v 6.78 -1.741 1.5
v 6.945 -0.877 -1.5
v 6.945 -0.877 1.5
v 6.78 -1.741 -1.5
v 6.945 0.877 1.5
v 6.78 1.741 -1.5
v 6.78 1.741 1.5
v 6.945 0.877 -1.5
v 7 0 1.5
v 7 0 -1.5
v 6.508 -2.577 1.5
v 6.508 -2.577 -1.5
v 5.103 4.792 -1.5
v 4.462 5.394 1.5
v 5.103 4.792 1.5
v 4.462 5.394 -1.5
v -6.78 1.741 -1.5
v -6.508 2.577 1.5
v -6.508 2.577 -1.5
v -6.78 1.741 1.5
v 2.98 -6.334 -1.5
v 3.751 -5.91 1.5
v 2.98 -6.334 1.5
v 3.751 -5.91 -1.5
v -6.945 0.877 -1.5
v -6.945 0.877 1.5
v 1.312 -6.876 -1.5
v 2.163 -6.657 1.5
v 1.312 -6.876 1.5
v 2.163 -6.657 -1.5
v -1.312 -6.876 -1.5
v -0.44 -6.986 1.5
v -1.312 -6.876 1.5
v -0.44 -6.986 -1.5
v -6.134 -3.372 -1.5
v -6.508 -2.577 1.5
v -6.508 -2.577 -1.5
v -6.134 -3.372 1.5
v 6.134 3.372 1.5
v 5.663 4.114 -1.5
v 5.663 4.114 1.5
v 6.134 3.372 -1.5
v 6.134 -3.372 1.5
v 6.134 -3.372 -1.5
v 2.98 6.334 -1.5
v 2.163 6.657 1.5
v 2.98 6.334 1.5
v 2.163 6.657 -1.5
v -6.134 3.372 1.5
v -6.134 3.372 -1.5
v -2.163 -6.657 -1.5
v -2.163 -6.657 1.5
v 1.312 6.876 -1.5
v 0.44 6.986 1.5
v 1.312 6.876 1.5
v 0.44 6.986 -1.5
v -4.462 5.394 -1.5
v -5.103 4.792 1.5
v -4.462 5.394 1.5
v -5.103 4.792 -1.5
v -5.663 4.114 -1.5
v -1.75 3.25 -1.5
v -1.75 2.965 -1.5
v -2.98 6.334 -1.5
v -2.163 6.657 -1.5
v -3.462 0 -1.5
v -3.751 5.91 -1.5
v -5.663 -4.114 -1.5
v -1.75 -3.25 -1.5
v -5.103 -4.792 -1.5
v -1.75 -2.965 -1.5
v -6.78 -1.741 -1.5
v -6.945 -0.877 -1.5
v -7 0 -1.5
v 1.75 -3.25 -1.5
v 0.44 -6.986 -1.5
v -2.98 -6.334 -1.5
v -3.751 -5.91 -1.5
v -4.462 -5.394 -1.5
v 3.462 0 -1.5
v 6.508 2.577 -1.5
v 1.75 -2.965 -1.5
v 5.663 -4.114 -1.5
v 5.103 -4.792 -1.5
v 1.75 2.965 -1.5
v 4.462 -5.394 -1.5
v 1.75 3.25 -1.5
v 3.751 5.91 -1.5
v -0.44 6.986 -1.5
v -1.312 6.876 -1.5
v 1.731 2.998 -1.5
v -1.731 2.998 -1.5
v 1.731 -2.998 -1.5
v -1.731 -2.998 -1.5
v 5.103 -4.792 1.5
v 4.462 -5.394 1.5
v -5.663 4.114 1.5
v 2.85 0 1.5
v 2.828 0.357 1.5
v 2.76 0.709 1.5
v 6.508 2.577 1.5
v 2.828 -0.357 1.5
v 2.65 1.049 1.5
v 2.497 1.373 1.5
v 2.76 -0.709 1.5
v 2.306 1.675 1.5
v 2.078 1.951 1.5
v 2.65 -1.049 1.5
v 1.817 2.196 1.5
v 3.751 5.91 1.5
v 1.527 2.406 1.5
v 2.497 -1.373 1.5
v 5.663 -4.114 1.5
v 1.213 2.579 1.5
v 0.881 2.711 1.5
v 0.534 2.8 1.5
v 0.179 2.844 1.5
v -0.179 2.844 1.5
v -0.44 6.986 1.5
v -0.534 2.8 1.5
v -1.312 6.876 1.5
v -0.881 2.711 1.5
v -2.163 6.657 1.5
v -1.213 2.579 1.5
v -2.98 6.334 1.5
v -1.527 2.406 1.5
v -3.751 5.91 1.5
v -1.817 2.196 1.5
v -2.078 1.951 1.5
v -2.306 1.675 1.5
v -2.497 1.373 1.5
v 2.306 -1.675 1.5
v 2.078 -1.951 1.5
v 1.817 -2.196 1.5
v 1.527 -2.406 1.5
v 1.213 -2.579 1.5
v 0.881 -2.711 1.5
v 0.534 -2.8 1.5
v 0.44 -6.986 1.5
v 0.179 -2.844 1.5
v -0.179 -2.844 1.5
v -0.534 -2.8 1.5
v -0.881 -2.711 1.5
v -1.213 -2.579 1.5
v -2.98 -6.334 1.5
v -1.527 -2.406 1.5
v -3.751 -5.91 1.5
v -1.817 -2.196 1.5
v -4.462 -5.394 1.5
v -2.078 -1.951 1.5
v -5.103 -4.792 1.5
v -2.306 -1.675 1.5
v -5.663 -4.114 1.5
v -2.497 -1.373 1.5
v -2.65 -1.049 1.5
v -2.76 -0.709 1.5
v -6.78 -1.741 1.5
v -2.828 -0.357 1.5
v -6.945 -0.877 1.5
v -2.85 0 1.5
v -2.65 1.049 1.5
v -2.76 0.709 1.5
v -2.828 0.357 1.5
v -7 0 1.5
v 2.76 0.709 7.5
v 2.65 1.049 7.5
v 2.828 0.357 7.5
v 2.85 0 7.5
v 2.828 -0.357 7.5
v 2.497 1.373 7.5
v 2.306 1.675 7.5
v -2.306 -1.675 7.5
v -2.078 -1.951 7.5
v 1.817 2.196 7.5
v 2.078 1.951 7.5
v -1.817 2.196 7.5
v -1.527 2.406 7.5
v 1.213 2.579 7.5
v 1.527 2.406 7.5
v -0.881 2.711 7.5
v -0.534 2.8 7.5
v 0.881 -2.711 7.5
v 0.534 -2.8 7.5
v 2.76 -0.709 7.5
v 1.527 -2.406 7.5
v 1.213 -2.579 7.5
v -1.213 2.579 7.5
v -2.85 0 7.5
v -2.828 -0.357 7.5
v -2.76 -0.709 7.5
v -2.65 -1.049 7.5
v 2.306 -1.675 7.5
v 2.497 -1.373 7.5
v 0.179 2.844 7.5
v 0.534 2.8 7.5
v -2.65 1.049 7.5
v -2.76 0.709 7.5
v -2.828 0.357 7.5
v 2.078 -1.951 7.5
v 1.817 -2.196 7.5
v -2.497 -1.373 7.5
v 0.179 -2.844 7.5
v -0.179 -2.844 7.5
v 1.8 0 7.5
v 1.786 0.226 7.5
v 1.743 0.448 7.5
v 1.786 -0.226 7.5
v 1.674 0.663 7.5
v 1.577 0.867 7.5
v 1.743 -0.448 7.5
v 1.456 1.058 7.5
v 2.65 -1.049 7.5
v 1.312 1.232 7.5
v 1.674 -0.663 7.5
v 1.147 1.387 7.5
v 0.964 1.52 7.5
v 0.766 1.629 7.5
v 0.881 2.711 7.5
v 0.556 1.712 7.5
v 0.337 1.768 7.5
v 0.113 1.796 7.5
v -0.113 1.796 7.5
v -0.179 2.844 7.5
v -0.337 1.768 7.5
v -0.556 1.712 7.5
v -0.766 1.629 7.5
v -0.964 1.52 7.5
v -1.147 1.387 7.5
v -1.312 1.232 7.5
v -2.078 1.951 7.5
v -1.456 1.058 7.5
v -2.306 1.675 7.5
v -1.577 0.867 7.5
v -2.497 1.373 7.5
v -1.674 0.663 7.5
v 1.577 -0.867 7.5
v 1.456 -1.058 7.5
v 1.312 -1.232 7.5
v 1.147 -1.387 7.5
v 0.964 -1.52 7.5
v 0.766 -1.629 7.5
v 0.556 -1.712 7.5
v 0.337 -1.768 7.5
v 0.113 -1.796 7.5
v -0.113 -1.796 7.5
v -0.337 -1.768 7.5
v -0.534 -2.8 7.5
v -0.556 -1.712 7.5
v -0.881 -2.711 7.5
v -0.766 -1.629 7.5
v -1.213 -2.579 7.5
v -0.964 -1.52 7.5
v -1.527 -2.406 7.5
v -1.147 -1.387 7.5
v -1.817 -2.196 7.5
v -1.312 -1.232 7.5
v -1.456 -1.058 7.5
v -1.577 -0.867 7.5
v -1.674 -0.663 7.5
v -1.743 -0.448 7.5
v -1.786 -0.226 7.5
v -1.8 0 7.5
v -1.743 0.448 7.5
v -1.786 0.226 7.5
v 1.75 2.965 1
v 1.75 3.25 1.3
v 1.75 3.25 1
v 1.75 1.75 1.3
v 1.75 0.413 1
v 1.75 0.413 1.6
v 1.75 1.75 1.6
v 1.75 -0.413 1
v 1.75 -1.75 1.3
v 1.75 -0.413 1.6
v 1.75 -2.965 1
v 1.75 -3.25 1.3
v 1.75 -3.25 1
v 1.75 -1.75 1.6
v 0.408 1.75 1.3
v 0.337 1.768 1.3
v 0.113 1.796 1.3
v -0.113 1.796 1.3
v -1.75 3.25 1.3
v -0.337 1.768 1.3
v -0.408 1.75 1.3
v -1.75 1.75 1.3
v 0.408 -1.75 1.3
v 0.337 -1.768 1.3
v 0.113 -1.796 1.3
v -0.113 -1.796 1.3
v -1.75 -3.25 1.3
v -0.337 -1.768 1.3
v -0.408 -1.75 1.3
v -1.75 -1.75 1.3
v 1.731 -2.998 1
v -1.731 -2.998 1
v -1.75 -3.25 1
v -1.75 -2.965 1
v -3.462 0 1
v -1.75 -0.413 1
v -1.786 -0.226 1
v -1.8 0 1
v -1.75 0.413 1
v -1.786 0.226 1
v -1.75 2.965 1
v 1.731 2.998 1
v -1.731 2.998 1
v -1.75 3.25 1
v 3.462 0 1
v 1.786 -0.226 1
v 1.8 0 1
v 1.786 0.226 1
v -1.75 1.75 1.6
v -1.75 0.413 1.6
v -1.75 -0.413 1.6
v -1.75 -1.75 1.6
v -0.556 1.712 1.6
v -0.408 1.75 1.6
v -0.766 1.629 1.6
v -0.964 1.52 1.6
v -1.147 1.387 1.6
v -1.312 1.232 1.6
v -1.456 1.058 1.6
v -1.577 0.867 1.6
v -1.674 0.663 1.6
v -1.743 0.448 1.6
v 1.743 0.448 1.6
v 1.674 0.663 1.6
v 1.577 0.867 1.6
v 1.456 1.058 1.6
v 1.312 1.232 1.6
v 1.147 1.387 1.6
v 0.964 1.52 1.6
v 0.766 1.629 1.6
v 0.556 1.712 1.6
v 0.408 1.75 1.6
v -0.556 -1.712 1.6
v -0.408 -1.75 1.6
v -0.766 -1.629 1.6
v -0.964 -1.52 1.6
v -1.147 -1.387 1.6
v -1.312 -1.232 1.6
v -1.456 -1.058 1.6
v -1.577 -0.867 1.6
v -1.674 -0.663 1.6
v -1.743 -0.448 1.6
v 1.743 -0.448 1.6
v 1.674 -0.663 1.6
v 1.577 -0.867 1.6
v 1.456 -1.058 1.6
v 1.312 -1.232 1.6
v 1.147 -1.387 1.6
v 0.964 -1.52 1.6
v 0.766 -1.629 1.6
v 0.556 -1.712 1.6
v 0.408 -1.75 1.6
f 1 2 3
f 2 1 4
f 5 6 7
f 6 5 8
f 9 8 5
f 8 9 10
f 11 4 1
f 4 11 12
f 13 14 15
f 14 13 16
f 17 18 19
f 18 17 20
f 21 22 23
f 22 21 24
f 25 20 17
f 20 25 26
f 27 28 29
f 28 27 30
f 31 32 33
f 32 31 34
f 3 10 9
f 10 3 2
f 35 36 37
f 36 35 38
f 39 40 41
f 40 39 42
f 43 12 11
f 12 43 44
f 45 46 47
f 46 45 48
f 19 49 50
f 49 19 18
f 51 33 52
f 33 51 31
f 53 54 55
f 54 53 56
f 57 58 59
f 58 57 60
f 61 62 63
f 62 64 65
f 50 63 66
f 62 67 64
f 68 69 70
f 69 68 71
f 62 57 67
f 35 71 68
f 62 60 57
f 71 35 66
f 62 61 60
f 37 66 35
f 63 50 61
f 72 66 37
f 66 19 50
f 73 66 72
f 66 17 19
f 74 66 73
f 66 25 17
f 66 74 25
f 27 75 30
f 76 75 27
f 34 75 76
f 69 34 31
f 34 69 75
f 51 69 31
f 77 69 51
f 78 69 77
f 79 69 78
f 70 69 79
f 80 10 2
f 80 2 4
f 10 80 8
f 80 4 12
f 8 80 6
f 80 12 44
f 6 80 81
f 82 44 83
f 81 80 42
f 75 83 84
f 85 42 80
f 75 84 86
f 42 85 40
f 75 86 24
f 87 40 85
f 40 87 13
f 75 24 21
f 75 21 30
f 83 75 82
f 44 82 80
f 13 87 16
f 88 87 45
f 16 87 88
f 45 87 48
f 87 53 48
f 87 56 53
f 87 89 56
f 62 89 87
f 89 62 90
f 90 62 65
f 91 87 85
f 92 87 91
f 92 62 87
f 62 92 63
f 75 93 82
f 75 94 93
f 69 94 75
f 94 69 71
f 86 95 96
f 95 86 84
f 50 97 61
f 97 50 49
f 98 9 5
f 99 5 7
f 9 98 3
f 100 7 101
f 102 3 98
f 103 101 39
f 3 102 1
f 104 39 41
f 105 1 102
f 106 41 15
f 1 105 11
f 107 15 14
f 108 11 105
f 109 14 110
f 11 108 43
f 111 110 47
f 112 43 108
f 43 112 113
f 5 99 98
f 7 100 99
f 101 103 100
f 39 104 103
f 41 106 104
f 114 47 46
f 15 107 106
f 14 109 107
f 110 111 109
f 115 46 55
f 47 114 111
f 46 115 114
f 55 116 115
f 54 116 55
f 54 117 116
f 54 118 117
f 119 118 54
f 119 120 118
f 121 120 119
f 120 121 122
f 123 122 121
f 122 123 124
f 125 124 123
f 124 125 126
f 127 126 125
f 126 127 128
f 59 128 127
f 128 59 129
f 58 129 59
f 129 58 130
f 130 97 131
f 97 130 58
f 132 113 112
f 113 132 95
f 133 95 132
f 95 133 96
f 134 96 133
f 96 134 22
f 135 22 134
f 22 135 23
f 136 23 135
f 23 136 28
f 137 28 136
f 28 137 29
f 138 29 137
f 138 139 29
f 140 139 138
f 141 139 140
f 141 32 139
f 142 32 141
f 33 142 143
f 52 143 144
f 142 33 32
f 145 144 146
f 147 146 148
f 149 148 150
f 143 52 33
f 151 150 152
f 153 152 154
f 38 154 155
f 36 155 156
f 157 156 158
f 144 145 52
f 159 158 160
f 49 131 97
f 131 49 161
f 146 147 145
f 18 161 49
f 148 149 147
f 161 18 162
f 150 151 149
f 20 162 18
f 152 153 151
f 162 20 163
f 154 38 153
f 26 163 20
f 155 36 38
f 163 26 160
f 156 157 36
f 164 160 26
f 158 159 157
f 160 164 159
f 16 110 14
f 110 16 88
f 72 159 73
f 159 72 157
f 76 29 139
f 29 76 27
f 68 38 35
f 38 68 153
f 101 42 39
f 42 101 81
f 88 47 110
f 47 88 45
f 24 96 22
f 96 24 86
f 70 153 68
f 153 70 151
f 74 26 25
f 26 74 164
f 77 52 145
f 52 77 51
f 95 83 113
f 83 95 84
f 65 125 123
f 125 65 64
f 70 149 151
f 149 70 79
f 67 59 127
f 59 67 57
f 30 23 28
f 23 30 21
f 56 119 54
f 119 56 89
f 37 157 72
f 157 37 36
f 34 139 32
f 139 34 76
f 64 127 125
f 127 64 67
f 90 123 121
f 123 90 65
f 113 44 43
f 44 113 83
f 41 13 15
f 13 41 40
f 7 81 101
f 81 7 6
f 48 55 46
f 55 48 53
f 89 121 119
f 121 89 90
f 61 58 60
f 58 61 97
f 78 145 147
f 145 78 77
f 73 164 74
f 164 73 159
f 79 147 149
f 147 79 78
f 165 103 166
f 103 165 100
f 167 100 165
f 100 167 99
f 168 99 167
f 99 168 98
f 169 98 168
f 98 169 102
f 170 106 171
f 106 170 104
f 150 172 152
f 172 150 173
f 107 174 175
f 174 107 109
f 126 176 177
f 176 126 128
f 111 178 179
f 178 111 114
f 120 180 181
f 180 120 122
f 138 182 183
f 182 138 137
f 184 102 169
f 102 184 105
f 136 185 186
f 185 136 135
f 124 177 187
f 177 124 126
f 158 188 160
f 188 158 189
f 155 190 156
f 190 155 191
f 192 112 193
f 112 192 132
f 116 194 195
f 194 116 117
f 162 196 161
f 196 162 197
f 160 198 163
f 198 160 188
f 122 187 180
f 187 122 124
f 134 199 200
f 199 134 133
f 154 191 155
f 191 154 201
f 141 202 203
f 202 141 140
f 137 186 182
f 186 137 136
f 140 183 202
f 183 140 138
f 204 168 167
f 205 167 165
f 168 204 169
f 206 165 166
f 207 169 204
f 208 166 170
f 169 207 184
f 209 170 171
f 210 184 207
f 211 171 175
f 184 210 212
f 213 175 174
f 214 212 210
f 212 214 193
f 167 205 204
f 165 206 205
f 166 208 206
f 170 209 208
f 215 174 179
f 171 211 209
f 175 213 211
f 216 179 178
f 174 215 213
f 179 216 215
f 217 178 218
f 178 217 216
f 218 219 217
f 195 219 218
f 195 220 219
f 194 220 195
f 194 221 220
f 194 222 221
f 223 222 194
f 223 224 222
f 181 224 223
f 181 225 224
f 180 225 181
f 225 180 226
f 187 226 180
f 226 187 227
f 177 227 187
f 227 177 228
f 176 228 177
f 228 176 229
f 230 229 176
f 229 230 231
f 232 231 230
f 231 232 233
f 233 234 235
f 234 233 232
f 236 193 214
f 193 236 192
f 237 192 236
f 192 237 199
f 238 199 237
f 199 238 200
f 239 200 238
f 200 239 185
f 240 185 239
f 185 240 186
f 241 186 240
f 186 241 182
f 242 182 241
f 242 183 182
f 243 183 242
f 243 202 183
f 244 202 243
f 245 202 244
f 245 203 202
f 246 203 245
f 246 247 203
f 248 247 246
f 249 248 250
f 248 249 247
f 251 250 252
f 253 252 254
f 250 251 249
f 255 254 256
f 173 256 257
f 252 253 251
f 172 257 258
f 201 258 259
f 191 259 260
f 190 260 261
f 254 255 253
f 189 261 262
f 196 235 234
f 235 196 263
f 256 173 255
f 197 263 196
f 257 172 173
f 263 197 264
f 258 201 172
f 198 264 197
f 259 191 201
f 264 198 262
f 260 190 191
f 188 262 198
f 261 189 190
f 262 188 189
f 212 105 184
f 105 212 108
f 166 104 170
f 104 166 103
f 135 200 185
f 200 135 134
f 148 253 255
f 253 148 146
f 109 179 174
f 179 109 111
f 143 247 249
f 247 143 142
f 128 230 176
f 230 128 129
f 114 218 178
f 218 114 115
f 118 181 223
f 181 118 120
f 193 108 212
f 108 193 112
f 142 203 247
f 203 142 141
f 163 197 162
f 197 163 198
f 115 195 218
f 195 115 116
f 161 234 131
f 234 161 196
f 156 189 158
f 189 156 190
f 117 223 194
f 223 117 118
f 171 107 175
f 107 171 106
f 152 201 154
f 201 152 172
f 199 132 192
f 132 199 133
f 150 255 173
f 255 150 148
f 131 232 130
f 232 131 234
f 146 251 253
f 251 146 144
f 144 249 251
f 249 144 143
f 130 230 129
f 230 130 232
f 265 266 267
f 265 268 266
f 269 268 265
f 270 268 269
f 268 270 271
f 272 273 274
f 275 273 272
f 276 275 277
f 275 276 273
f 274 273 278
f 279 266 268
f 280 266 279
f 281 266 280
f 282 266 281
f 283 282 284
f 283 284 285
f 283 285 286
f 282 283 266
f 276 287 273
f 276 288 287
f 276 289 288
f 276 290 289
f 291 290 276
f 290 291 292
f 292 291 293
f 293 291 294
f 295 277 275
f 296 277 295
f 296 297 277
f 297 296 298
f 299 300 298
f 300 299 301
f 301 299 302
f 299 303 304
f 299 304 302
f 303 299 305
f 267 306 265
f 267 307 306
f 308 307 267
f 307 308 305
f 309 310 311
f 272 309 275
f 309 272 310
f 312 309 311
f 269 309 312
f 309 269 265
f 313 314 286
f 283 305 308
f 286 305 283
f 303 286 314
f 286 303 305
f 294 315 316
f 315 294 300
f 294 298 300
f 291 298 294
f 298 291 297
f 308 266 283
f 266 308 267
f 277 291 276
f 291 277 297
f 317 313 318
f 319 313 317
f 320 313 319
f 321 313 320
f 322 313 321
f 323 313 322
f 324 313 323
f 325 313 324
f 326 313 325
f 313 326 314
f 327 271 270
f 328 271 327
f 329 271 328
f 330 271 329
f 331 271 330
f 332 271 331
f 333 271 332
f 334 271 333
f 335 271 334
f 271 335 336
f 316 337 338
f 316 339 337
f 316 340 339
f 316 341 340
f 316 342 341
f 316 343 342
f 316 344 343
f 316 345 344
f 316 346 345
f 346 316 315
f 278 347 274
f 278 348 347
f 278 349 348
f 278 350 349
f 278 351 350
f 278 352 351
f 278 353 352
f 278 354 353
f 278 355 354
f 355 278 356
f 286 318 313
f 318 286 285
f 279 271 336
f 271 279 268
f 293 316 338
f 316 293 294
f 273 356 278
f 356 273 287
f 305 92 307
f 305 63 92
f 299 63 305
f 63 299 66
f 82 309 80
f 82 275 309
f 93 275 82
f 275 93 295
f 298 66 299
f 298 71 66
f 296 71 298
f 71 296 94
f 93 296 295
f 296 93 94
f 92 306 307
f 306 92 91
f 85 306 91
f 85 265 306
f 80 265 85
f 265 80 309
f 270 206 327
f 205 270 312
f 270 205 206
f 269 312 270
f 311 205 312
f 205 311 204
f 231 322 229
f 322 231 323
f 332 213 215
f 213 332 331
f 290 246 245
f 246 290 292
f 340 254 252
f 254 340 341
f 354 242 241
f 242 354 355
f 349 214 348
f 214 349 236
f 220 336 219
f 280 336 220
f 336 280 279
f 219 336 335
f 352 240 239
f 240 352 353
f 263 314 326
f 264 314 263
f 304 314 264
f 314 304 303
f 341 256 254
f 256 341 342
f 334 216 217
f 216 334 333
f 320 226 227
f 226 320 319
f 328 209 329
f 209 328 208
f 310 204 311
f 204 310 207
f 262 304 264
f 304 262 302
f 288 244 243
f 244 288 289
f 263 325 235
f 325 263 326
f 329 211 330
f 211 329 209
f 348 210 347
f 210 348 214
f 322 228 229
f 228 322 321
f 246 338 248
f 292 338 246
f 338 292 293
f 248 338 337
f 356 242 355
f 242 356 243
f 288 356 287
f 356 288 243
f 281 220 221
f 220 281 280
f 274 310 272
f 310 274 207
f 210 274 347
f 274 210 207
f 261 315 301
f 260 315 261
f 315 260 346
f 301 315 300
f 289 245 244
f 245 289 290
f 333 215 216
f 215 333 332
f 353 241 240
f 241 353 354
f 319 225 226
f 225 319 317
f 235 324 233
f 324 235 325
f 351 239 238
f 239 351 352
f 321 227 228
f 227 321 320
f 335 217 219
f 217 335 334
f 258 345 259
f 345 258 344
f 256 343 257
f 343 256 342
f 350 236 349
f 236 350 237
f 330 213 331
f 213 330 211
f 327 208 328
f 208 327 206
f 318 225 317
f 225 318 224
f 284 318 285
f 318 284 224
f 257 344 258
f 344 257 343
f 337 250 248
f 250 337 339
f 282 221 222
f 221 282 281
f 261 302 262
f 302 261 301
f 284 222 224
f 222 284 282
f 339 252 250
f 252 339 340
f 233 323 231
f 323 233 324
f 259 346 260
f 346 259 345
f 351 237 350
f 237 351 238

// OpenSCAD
$fn = 50;


difference() {
	union() {
		translate(v = [0, 0, -1.5000000000]) {
			cylinder(h = 3, r = 7.0000000000);
		}
		translate(v = [0, 0, -1.5000000000]) {
			cylinder(h = 9, r = 2.8500000000);
		}
	}
	union() {
		translate(v = [0, 0, -1.5000000000]) {
			rotate(a = [0, 0, 0]) {
				difference() {
					union() {
						translate(v = [-1.7500000000, -3.2500000000, -0.3000000000]) {
							cube(size = [3.5000000000, 6.5000000000, 0.3000000000]);
						}
						translate(v = [-1.7500000000, -1.7500000000, -0.6000000000]) {
							cube(size = [3.5000000000, 3.5000000000, 0.3000000000]);
						}
						translate(v = [-1.7500000000, -3.2500000000, 2.5000000000]) {
							cube(size = [3.5000000000, 6.5000000000, 0.3000000000]);
						}
						translate(v = [-1.7500000000, -1.7500000000, 2.8000000000]) {
							cube(size = [3.5000000000, 3.5000000000, 0.3000000000]);
						}
						linear_extrude(height = 2.5000000000) {
							polygon(points = [[3.4620000000, 0.0000000000], [1.7310000000, 2.9981799479], [-1.7310000000, 2.9981799479], [-3.4620000000, 0.0000000000], [-1.7310000000, -2.9981799479], [1.7310000000, -2.9981799479]]);
						}
						translate(v = [-1.7500000000, -3.2500000000, -0.3000000000]) {
							cube(size = [3.5000000000, 6.5000000000, 0.3000000000]);
						}
						translate(v = [-1.7500000000, -1.7500000000, -0.6000000000]) {
							cube(size = [3.5000000000, 3.5000000000, 0.3000000000]);
						}
						translate(v = [-1.7500000000, -3.2500000000, 2.5000000000]) {
							cube(size = [3.5000000000, 6.5000000000, 0.3000000000]);
						}
						translate(v = [-1.7500000000, -1.7500000000, 2.8000000000]) {
							cube(size = [3.5000000000, 3.5000000000, 0.3000000000]);
						}
						translate(v = [-1.7500000000, -3.2500000000, -0.3000000000]) {
							cube(size = [3.5000000000, 6.5000000000, 0.3000000000]);
						}
						translate(v = [-1.7500000000, -1.7500000000, -0.6000000000]) {
							cube(size = [3.5000000000, 3.5000000000, 0.3000000000]);
						}
						translate(v = [-1.7500000000, -3.2500000000, 2.5000000000]) {
							cube(size = [3.5000000000, 6.5000000000, 0.3000000000]);
						}
						translate(v = [-1.7500000000, -1.7500000000, 2.8000000000]) {
							cube(size = [3.5000000000, 3.5000000000, 0.3000000000]);
						}
					}
					union();
				}
			}
		}
		translate(v = [0, 0, -100.0000000000]) {
			cylinder(h = 200, r = 1.8000000000);
		}
	}
}
